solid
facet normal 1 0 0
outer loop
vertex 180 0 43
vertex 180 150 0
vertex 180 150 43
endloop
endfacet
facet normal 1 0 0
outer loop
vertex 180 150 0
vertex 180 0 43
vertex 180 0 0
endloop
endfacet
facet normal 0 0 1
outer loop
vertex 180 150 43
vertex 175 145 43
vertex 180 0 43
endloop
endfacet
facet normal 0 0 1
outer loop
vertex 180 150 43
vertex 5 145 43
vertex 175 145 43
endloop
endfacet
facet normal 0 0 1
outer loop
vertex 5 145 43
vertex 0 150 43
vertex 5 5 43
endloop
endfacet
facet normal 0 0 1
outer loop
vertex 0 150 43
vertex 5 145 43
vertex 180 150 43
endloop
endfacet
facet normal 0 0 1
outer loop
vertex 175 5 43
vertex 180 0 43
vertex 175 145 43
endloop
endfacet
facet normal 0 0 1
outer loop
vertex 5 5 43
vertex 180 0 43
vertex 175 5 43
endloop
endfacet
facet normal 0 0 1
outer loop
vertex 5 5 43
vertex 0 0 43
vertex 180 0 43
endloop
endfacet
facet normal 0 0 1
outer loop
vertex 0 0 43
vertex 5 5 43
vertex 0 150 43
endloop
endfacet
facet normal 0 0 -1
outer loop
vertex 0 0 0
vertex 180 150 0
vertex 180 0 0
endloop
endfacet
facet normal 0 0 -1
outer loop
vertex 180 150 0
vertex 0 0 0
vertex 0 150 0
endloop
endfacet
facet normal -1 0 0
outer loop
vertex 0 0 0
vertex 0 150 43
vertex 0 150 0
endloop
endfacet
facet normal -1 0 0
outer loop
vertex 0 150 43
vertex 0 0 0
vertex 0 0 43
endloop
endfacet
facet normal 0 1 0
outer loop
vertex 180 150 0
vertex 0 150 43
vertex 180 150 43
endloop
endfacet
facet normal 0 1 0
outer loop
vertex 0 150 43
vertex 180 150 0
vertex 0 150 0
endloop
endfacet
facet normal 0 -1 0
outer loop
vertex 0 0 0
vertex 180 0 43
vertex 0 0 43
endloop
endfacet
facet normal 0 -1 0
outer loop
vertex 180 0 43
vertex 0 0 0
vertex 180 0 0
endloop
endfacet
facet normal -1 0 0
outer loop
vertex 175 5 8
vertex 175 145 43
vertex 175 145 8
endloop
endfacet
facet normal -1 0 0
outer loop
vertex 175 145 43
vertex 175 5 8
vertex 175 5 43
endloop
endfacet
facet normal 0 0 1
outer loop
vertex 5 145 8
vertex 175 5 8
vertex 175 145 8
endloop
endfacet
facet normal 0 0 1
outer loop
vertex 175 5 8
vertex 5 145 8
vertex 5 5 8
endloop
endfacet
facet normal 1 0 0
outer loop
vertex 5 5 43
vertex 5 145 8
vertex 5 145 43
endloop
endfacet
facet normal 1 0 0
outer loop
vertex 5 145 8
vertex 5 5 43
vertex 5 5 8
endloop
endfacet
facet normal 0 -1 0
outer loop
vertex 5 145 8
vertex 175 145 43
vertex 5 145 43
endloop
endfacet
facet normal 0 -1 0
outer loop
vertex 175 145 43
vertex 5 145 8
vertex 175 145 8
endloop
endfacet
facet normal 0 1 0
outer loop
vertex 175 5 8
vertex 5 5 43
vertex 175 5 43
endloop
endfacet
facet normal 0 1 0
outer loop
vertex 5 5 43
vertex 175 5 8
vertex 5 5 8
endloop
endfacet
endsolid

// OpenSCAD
//
// Parametric enclosure with outer (overlap) lid
// Author: ChatGPT
//
// How to use in OpenSCAD:
// 1) Set part = "bottom" or "lid" below.
// 2) Press F6 (Render) then File -> Export -> STL.
//
// Dimensions per user's spec:
// - Inner cavity (usable): 170 x 140 x 35 mm
// - Horizontal (top & bottom) walls: 8 mm
// - Side walls (both bottom and lid skirt): 5 mm
// - Lid style: outer slip-over cap
// - Clearance: 0.3 mm per side (total +0.6 mm in X and Y)
// - Lid overlap (skirt depth): 12 mm
//
// Derived (do not edit unless you know what you're doing):
// - Bottom outer: 180 x 150 x 43 mm
// - Lid inner: 180.6 x 150.6 x 12 mm
// - Lid outer: 190.6 x 160.6 x 20 mm
//

// ---------------- Parameters ----------------
part = "bottom"; // "bottom" or "lid"

inner_x = 170;
inner_y = 140;
inner_z = 35;

side_wall = 5;                // side wall thickness (bottom & lid skirt)
top_bottom_thick = 8;         // thickness of top & bottom plates
clearance = 0.3;              // per side (total +0.6 in X/Y)
lid_overlap = 12;             // skirt depth

// ---------------- Derived sizes ----------------
outer_x = inner_x + 2*side_wall;
outer_y = inner_y + 2*side_wall;
outer_z = inner_z + top_bottom_thick;

// Lid internal size (to slide over bottom outer, with clearance each side)
lid_inner_x = outer_x + 2*clearance;
lid_inner_y = outer_y + 2*clearance;
lid_inner_z = lid_overlap;

// Lid external box
lid_outer_x = lid_inner_x + 2*side_wall;
lid_outer_y = lid_inner_y + 2*side_wall;
lid_outer_z = top_bottom_thick + lid_overlap;

// ---------------- Modules ----------------
module bottom_box(){
    // Outer solid
    difference(){
        cube([outer_x, outer_y, outer_z], center=false);
        // Inner cavity: inset by side_wall on X/Y and offset up by top_bottom_thick
        translate([side_wall, side_wall, top_bottom_thick])
            cube([inner_x, inner_y, inner_z], center=false);
    }
}

module lid_outer(){
    difference(){
        cube([lid_outer_x, lid_outer_y, lid_outer_z], center=false);
        // Inner cut for the skirt: leaves an 8 mm top, skirt depth = lid_overlap
        translate([side_wall, side_wall, 0])
            cube([lid_inner_x, lid_inner_y, lid_inner_z], center=false);
    }
}

// ---------------- Output ----------------
if (part == "bottom"){
    bottom_box();
} else if (part == "lid"){
    lid_outer();
} else {
    // Show both for preview (offset the lid for visibility)
    bottom_box();
    translate([0, outer_y + 10, 0]) lid_outer();
}
